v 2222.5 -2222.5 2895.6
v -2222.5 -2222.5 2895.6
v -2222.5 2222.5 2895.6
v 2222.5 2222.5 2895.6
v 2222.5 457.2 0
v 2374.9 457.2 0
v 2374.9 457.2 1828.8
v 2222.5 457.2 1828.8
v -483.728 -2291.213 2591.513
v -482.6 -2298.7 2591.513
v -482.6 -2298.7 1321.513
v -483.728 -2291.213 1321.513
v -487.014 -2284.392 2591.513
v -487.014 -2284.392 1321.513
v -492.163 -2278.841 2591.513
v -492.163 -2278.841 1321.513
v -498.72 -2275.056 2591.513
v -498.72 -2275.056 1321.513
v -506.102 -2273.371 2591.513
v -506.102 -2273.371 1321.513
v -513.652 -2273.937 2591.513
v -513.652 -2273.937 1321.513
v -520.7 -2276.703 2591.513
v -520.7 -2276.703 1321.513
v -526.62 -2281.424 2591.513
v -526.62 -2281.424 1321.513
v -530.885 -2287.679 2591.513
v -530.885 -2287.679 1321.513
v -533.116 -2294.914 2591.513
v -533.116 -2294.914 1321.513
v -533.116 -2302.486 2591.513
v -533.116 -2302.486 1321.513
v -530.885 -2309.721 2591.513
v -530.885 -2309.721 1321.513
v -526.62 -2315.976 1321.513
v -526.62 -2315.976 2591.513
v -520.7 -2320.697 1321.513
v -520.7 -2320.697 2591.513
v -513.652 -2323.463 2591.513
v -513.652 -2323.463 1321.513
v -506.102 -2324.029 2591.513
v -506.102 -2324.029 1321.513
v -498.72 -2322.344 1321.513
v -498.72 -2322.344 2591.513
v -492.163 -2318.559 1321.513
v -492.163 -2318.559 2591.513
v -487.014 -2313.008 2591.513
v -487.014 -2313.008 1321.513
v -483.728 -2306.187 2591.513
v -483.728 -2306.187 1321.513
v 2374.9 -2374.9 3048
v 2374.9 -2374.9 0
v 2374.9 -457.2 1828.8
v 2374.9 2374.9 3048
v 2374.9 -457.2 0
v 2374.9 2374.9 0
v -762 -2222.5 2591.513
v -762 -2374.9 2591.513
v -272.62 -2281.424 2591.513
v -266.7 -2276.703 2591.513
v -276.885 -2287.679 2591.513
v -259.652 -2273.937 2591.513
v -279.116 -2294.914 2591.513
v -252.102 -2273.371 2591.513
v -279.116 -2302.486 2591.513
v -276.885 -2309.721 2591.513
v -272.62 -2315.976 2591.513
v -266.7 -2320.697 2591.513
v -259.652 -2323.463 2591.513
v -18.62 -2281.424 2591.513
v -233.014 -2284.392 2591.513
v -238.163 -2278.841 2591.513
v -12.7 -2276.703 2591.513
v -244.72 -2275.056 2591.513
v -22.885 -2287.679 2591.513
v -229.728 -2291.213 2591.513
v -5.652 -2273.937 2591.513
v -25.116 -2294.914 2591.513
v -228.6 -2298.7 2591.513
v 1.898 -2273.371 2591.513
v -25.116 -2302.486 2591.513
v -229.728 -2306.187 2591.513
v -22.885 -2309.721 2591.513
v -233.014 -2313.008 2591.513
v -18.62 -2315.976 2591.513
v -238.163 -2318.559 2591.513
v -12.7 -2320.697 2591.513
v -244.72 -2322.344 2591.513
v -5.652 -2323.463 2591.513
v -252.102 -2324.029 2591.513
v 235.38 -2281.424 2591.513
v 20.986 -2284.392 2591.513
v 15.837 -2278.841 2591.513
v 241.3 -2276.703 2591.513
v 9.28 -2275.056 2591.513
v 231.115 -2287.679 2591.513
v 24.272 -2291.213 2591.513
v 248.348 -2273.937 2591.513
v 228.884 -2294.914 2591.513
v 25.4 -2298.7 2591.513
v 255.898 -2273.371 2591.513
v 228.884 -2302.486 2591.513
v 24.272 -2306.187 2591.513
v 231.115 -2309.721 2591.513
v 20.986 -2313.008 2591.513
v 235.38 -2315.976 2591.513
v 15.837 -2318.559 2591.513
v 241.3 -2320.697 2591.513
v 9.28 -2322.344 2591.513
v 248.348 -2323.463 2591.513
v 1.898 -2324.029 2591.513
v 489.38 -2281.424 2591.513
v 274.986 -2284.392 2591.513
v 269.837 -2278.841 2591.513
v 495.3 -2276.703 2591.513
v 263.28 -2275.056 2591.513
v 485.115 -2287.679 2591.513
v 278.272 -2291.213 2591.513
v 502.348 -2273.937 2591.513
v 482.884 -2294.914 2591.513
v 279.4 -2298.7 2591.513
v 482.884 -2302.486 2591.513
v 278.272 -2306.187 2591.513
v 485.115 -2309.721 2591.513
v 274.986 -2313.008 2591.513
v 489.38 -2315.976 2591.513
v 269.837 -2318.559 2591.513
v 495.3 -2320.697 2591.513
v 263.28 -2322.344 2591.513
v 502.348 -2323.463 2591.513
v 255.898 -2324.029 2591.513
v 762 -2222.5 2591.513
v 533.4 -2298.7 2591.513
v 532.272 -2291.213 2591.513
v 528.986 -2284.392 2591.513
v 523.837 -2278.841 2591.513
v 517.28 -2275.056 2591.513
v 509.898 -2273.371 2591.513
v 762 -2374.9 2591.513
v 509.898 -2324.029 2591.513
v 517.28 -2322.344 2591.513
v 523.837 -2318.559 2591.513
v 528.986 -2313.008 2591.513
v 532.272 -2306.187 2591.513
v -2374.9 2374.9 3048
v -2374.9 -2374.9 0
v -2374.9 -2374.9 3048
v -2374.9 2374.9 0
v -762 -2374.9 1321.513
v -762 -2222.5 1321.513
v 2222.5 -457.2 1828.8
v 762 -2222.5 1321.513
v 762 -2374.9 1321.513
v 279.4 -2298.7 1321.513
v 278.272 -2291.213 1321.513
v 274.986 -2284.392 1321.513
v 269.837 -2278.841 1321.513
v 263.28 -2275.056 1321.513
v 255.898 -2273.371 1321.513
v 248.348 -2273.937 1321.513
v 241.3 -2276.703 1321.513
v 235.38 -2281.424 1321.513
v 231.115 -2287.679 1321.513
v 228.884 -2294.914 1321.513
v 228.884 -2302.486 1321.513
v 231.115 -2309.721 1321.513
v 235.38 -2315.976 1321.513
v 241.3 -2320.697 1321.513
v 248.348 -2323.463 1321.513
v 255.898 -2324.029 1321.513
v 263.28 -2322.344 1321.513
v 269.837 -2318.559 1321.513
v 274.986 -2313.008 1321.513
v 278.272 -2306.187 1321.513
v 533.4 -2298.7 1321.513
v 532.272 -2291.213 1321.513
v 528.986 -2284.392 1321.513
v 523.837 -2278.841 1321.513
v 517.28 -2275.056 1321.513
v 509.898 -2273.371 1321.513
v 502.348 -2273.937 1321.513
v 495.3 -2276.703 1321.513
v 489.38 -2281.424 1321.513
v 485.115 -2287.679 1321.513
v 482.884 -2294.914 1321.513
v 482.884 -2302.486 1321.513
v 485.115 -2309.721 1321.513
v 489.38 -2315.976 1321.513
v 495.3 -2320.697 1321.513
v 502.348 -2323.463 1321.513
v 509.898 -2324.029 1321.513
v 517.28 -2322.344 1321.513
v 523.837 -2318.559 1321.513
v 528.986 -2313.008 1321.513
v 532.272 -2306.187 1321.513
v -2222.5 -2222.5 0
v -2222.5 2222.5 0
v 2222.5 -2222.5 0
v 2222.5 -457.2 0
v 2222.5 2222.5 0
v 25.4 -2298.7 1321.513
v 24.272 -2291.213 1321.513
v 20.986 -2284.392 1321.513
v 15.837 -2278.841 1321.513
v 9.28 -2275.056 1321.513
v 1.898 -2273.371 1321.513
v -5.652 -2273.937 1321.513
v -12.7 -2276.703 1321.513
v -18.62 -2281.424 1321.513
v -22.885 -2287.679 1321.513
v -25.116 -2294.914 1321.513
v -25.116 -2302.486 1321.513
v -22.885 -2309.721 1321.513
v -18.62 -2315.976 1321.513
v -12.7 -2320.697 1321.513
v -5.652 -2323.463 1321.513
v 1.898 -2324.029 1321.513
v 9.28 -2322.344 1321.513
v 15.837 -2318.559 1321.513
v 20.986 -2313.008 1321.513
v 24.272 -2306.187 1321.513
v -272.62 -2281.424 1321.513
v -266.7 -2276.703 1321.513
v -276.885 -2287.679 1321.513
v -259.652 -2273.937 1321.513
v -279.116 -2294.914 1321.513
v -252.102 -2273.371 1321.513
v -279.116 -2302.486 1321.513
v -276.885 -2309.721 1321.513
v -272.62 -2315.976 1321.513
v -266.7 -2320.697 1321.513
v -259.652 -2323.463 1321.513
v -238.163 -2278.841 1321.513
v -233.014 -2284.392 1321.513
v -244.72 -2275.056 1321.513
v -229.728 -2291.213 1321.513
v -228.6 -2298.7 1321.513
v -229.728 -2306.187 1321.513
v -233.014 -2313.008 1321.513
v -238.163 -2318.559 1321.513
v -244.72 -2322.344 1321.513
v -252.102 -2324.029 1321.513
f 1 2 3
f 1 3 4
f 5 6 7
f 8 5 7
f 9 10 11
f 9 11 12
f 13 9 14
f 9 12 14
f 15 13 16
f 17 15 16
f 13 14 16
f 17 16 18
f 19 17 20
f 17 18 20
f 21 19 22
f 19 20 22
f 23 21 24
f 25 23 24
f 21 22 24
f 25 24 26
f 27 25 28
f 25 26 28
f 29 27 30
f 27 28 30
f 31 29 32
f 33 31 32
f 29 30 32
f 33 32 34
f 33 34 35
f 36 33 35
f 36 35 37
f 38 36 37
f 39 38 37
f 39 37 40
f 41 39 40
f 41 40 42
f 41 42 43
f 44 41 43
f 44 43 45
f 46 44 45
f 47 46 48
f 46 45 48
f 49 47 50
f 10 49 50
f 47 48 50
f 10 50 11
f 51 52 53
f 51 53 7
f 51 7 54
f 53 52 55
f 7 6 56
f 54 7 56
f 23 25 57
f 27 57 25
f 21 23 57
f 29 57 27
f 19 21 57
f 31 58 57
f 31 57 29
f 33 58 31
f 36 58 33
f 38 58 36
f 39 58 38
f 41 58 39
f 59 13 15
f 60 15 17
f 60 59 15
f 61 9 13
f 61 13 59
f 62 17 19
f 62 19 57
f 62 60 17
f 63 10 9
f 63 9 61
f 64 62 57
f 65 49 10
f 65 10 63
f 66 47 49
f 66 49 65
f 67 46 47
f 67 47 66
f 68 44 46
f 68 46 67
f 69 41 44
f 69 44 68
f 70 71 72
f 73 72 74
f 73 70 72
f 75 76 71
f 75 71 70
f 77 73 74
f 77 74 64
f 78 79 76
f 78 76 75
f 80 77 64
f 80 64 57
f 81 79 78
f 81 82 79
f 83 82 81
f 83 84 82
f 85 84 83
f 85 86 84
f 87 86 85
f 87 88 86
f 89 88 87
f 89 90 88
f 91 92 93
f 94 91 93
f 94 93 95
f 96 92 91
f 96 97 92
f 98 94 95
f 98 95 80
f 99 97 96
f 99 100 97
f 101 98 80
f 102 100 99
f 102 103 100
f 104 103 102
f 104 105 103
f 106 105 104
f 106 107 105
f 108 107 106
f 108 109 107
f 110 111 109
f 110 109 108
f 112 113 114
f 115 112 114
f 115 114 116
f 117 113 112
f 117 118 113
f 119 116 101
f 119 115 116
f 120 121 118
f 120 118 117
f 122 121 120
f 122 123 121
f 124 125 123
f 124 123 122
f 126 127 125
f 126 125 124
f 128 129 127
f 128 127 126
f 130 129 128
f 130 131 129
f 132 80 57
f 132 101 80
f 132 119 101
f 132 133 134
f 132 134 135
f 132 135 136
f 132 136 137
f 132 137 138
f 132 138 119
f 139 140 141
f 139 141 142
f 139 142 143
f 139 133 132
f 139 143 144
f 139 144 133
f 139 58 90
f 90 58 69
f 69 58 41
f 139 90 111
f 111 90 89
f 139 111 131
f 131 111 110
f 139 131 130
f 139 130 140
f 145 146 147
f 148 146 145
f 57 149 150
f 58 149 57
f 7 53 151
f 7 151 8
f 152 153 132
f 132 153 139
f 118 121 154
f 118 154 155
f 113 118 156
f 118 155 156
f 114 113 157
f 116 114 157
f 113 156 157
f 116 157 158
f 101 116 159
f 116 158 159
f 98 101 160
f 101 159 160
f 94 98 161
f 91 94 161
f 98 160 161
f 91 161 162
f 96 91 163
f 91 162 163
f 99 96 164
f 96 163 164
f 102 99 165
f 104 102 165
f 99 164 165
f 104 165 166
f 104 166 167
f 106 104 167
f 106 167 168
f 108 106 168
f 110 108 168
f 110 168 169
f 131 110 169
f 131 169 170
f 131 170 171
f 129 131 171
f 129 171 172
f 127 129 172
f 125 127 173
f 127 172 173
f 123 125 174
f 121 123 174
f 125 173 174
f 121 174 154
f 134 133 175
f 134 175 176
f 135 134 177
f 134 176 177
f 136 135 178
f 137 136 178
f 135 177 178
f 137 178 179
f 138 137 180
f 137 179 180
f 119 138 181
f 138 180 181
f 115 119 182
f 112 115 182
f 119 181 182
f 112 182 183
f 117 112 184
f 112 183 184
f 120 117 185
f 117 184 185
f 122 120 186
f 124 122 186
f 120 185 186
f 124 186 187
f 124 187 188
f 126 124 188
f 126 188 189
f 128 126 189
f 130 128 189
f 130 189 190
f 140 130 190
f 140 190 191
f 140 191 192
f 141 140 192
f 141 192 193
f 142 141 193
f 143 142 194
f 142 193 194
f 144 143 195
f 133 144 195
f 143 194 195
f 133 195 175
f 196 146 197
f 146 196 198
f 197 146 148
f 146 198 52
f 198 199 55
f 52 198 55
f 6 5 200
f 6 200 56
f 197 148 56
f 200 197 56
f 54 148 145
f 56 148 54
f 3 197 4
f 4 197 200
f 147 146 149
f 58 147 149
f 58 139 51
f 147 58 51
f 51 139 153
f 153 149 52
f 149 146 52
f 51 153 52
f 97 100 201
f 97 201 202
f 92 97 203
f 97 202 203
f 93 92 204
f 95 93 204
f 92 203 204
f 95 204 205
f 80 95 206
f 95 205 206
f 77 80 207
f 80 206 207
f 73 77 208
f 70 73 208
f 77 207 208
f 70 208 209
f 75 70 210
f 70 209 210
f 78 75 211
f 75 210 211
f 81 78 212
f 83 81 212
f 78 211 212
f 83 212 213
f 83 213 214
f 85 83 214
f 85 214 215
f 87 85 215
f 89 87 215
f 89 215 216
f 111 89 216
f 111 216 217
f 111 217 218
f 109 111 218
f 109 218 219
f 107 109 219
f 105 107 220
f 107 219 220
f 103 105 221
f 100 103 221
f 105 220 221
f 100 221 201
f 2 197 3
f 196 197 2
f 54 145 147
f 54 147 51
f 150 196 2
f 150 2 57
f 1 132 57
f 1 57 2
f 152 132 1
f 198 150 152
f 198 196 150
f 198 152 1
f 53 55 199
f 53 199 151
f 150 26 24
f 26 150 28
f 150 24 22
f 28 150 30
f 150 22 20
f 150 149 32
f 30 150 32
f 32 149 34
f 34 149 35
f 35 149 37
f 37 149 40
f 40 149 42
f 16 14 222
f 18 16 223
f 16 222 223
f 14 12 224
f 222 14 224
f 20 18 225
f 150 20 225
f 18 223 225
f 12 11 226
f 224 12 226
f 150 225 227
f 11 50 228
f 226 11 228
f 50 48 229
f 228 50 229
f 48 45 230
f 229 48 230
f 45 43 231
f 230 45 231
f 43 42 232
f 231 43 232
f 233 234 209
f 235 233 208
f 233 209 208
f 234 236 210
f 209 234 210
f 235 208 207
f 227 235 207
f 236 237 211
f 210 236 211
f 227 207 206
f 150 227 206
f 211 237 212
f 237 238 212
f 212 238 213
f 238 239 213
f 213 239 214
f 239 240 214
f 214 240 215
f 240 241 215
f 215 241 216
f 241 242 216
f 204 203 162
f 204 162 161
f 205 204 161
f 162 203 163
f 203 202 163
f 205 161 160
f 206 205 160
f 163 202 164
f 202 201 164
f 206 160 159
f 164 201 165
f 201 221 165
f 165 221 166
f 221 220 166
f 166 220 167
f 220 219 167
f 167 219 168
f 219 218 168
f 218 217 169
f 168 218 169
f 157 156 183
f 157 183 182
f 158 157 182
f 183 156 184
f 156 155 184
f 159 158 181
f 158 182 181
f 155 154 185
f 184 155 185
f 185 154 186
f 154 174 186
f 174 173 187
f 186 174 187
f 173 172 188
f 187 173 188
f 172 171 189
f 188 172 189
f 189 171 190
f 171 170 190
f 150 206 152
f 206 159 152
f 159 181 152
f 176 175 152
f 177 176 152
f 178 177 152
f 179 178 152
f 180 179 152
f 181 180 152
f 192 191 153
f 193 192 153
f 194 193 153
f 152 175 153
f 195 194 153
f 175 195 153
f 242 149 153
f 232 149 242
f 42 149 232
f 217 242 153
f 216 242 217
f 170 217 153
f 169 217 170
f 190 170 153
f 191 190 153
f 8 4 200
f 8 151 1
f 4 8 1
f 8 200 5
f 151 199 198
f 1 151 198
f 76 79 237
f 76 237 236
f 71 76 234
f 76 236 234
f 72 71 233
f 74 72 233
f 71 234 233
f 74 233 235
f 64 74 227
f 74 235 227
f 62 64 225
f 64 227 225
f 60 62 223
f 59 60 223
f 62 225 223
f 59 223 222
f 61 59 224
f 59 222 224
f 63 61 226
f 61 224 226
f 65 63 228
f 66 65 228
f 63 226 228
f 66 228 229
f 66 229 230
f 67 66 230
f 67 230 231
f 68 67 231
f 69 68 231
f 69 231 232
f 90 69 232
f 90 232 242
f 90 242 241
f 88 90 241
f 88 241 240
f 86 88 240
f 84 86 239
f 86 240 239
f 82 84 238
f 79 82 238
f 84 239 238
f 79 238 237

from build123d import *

# Parameters (mm, degrees)
F0_W     = 4749.8
F0_H     = 4749.8
F1_DEPTH = 3048
F2_W     = 1524
F2_H     = 1270
F3_DEPTH = 152.4
F4_W     = 4445
F4_H     = 4445
F5_DEPTH = 2895.6
F6_R     = 25.4
F7_DEPTH = 1270
F8_W     = 914.4
F8_H     = 3657.6
F9_DEPTH = 152.4


with BuildPart() as f1:
    # F0 (on Top) → F1 (new body)
    with BuildSketch(Plane.XY):
        Rectangle(F0_W, F0_H)
    extrude(amount=F1_DEPTH)

    # F2 (on face) → F3 (cut)
    with BuildSketch(Plane.XZ.offset(2374.9)):
        with Locations((0, 1956.513322)):
            Rectangle(F2_W, F2_H)
    extrude(amount=-F3_DEPTH, mode=Mode.SUBTRACT)

    # F4 (on face) → F5 (cut)
    with BuildSketch(Plane(origin=(0, 0, 0), x_dir=(1, 0, 0), z_dir=(0, 0, -1))):
        Rectangle(F4_W, F4_H)
    extrude(amount=-F5_DEPTH, mode=Mode.SUBTRACT)

    # F6 (on face) → F7 (join)
    with BuildSketch(Plane.XY.offset(1321.513322)):
        with Locations((-508, -2298.7)):
            Circle(F6_R)
        with Locations((0, -2298.7)):
            Circle(F6_R)
        with Locations((508, -2298.7)):
            Circle(F6_R)
        with Locations((-254, -2298.7)):
            Circle(F6_R)
        with Locations((254, -2298.7)):
            Circle(F6_R)
    extrude(amount=F7_DEPTH)

    # F8 (on face) → F9 (cut)
    with BuildSketch(Plane.YZ.offset(2374.9)):
        Rectangle(F8_W, F8_H)
    extrude(amount=-F9_DEPTH, mode=Mode.SUBTRACT)


solid = f1.part
